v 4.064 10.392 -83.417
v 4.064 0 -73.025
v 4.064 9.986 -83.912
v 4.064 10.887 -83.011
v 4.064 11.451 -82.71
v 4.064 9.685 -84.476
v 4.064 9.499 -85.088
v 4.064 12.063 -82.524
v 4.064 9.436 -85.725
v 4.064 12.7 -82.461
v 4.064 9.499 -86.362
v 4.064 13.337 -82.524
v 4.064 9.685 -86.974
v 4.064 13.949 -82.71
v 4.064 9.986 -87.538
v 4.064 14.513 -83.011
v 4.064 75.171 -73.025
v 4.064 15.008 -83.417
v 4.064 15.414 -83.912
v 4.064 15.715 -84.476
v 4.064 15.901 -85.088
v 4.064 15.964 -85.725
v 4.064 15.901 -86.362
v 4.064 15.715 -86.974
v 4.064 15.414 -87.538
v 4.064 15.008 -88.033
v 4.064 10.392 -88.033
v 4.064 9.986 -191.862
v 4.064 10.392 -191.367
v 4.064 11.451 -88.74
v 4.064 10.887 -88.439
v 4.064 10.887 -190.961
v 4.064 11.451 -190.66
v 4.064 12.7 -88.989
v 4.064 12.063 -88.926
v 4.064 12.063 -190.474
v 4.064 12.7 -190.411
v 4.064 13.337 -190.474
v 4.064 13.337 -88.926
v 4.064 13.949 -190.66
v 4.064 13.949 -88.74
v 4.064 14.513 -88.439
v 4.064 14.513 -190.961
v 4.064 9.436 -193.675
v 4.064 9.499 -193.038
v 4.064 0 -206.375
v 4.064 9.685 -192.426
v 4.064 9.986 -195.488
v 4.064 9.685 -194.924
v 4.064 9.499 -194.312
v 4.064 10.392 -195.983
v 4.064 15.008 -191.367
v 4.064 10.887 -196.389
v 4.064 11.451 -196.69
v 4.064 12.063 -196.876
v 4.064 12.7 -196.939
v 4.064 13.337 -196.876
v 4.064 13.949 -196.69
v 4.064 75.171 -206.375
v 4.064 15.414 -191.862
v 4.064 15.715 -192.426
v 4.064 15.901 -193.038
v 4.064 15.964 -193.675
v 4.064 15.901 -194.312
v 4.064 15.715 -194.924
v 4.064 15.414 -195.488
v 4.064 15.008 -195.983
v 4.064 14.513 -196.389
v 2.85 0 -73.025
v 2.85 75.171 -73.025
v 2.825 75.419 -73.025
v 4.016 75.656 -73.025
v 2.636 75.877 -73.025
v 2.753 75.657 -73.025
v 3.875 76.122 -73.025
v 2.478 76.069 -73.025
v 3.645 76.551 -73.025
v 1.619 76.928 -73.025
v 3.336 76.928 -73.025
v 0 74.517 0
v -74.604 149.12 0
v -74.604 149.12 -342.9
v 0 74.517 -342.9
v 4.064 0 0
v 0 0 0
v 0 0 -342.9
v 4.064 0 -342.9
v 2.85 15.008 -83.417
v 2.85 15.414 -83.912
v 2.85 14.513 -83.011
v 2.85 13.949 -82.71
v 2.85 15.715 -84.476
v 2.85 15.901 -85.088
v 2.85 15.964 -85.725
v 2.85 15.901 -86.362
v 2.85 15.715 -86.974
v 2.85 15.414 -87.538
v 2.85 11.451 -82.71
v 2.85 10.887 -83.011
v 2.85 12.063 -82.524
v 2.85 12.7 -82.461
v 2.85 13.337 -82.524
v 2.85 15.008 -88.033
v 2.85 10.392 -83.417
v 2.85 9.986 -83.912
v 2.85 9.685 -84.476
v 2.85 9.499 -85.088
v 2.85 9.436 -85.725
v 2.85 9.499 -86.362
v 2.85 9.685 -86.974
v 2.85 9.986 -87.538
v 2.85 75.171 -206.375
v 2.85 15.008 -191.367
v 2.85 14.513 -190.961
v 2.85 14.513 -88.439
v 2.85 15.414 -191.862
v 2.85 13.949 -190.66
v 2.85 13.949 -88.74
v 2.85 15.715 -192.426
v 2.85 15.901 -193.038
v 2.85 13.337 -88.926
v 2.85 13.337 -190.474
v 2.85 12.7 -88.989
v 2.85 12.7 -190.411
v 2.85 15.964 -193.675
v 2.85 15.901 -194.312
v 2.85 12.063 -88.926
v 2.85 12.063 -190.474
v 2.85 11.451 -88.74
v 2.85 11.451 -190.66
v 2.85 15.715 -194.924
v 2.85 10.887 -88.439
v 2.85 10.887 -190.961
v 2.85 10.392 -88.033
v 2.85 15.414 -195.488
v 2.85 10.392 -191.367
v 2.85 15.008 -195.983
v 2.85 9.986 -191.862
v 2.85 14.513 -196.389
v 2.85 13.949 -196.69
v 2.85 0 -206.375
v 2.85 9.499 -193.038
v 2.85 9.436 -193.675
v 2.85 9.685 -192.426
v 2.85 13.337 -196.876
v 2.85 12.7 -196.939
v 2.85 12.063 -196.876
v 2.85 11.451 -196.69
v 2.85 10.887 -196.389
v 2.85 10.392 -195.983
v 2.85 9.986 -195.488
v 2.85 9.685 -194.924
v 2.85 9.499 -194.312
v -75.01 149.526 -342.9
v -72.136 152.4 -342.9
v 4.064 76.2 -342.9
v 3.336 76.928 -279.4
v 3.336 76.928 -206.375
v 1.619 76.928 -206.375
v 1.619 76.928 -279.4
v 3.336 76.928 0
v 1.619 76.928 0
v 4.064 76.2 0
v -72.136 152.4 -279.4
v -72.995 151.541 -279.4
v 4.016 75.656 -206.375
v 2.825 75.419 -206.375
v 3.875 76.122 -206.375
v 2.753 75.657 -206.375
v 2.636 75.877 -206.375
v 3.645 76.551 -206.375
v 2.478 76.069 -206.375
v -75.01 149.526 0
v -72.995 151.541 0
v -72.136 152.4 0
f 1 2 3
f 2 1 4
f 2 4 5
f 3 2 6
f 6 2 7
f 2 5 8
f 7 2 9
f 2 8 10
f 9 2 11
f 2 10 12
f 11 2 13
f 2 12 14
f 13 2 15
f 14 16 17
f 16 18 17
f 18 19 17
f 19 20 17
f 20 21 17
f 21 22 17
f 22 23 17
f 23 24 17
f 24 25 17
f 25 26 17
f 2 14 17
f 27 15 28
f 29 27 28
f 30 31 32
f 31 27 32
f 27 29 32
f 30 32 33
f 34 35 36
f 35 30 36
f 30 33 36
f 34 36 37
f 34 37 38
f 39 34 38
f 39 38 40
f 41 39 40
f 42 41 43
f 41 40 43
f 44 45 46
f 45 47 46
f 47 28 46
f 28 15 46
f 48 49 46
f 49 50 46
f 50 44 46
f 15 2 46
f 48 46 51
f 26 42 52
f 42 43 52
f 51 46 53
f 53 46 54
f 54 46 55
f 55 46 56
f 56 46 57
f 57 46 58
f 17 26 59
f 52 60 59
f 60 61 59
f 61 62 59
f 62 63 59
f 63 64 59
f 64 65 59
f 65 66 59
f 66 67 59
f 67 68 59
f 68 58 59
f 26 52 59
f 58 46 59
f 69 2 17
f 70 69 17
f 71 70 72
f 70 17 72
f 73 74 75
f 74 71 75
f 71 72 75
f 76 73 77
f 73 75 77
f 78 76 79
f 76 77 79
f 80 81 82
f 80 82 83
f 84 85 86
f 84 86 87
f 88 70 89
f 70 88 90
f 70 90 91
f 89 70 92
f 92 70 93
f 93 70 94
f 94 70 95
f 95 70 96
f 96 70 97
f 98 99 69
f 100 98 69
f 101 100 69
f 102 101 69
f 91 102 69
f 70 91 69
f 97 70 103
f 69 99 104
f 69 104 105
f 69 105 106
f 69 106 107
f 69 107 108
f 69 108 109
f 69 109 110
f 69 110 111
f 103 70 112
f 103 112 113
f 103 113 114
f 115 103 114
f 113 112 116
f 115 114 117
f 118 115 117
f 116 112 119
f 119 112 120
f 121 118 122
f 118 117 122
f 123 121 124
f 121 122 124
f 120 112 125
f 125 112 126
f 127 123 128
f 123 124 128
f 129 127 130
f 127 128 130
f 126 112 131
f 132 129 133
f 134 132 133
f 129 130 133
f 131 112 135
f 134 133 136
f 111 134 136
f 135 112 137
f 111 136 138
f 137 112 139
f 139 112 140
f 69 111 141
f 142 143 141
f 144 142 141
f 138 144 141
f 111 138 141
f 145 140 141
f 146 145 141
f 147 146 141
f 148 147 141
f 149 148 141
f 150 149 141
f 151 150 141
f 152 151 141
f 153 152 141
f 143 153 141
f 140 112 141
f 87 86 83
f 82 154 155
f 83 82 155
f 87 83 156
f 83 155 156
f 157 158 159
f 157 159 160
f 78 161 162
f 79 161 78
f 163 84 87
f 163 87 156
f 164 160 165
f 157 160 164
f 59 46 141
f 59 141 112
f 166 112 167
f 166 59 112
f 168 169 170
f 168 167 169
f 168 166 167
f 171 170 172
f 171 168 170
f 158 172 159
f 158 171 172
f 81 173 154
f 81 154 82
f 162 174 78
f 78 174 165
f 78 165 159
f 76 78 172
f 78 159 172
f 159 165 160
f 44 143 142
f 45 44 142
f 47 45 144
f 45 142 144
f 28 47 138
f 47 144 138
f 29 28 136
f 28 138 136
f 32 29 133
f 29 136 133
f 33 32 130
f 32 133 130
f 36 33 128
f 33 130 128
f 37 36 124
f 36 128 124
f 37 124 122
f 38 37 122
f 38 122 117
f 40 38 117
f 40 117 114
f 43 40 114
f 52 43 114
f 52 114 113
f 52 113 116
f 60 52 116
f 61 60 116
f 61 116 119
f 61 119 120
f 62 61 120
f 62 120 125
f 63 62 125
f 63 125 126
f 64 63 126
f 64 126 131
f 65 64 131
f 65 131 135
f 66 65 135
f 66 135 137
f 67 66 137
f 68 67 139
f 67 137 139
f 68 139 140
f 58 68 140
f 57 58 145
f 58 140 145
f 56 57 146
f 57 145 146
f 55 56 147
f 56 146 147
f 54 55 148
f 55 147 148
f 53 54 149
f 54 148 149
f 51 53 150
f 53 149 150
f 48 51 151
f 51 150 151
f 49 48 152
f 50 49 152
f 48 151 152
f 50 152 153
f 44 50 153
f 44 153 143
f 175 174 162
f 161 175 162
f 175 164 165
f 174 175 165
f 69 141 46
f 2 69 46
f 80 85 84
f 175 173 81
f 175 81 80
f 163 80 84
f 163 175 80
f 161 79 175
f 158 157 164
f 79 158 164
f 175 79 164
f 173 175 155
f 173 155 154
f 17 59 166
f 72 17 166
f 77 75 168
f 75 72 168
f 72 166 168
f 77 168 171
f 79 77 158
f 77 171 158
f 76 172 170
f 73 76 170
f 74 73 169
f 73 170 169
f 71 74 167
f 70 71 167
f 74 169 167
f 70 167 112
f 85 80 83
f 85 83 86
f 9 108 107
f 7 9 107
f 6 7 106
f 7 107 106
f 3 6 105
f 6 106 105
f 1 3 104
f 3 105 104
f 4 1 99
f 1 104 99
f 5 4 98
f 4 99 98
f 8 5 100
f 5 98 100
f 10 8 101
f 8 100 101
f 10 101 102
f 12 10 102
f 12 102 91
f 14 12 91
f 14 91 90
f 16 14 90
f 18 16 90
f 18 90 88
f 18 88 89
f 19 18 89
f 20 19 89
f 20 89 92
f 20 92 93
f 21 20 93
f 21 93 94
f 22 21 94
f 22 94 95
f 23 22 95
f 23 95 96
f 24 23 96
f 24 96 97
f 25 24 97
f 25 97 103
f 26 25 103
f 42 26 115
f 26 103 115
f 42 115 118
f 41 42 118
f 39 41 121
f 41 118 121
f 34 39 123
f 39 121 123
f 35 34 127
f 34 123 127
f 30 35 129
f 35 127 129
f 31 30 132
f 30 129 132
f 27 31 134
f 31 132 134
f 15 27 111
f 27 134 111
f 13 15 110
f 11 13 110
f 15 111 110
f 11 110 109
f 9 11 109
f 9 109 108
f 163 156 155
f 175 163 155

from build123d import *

# Parameters (mm, degrees)
BOSS_EXTRUDE2_DEPTH  = 342.9
CONVERT_SOLID2_START = -342.9
CONVERT_SOLID2_DEPTH = 342.9
SKETCH12_W           = 73.025
SKETCH12_H           = 76.927581903
CUT_EXTRUDE1_DEPTH   = 292.1
SKETCH13_W           = 85.725
SKETCH13_H           = 76.927581903
CUT_EXTRUDE2_DEPTH   = 292.1
SKETCH14_R           = 3.2639
CUT_EXTRUDE3_DEPTH   = 292.1
SKETCH18_W           = 50.8
SKETCH18_H           = 76.927581903
CUT_EXTRUDE4_DEPTH   = 439.772530417
SKETCH21_W           = 63.5
SKETCH21_H           = 100.852216804
CUT_EXTRUDE11_DEPTH  = 439.772530417


# Read off the part's stored shape, not the designer's step: Convert-Solid2
with BuildPart() as part:
    # Sketch7 → Boss-Extrude2 (new body)
    with BuildSketch(Plane.XY):
        Polygon((0, 0), (4.064, 0), (4.064, 76.2), (-72.136, 152.4), (-75.009681959, 149.526318041), (-74.603697881, 149.120333963), (0, 74.516636083), align=None)
    extrude(amount=-BOSS_EXTRUDE2_DEPTH)


with BuildPart() as body_2:
    # Convert-Solid2 outline → Convert-Solid2 (new body)
    with BuildSketch(Plane.XY.offset(CONVERT_SOLID2_START)):
        with BuildLine():
            Line((2.84988, 0), (4.064, 0))
            Line((4.064, 0), (4.064, 75.171043805))
            ThreePointArc((4.064, 75.171043805), (3.874907624, 76.121675373), (3.336418097, 76.927581903))
            Line((3.336418097, 76.927581903), (-72.136, 152.4))
            Line((-72.136, 152.4), (-72.994512485, 151.541487515))
            Line((-72.994512485, 151.541487515), (2.477905612, 76.069069418))
            ThreePointArc((2.477905612, 76.069069418), (2.753207006, 75.657051765), (2.84988, 75.171043805))
            Line((2.84988, 75.171043805), (2.84988, 0))
        make_face()
    extrude(amount=CONVERT_SOLID2_DEPTH)

    # Sketch12 → Cut-Extrude1 (cut)
    with BuildSketch(Plane(origin=(152.4, 0, 0), x_dir=(0, 0, -1), z_dir=(1, 0, 0))):
        with Locations((36.5125, 38.463790952)):
            Rectangle(SKETCH12_W, SKETCH12_H)
    extrude(amount=-CUT_EXTRUDE1_DEPTH, mode=Mode.SUBTRACT)

    # Sketch13 → Cut-Extrude2 (cut)
    with BuildSketch(Plane(origin=(152.4, 0, 0), x_dir=(0, 0, -1), z_dir=(1, 0, 0))):
        with Locations((249.2375, 38.463790952)):
            Rectangle(SKETCH13_W, SKETCH13_H)
    extrude(amount=-CUT_EXTRUDE2_DEPTH, mode=Mode.SUBTRACT)

    # Sketch14 → Cut-Extrude3 (cut)
    with BuildSketch(Plane.ZY.offset(-2.84988)):
        with Locations(Location((-193.675, 12.7, 0), (0, 0, 270))):
            Circle(SKETCH14_R)
        with Locations(Location((-85.725, 12.7, 0), (0, 0, 270))):
            Circle(SKETCH14_R)
    extrude(amount=-CUT_EXTRUDE3_DEPTH, mode=Mode.SUBTRACT)

    # Sketch18 → Cut-Extrude4 (cut, through all)
    with BuildSketch(Plane(origin=(152.4, 0, 0), x_dir=(0, 0, -1), z_dir=(1, 0, 0))):
        with Locations((317.5, 38.463790952)):
            Rectangle(SKETCH18_W, SKETCH18_H)
    extrude(amount=-CUT_EXTRUDE4_DEPTH, mode=Mode.SUBTRACT)

    # Sketch21 → Cut-Extrude11 (cut, through all)
    with BuildSketch(Plane(origin=(152.4, 0, 0), x_dir=(0, 0, -1), z_dir=(1, 0, 0))):
        with Locations((311.15, 127.353690305)):
            Rectangle(SKETCH21_W, SKETCH21_H)
    extrude(amount=-CUT_EXTRUDE11_DEPTH, mode=Mode.SUBTRACT)


solid = Compound([part.part, body_2.part])
